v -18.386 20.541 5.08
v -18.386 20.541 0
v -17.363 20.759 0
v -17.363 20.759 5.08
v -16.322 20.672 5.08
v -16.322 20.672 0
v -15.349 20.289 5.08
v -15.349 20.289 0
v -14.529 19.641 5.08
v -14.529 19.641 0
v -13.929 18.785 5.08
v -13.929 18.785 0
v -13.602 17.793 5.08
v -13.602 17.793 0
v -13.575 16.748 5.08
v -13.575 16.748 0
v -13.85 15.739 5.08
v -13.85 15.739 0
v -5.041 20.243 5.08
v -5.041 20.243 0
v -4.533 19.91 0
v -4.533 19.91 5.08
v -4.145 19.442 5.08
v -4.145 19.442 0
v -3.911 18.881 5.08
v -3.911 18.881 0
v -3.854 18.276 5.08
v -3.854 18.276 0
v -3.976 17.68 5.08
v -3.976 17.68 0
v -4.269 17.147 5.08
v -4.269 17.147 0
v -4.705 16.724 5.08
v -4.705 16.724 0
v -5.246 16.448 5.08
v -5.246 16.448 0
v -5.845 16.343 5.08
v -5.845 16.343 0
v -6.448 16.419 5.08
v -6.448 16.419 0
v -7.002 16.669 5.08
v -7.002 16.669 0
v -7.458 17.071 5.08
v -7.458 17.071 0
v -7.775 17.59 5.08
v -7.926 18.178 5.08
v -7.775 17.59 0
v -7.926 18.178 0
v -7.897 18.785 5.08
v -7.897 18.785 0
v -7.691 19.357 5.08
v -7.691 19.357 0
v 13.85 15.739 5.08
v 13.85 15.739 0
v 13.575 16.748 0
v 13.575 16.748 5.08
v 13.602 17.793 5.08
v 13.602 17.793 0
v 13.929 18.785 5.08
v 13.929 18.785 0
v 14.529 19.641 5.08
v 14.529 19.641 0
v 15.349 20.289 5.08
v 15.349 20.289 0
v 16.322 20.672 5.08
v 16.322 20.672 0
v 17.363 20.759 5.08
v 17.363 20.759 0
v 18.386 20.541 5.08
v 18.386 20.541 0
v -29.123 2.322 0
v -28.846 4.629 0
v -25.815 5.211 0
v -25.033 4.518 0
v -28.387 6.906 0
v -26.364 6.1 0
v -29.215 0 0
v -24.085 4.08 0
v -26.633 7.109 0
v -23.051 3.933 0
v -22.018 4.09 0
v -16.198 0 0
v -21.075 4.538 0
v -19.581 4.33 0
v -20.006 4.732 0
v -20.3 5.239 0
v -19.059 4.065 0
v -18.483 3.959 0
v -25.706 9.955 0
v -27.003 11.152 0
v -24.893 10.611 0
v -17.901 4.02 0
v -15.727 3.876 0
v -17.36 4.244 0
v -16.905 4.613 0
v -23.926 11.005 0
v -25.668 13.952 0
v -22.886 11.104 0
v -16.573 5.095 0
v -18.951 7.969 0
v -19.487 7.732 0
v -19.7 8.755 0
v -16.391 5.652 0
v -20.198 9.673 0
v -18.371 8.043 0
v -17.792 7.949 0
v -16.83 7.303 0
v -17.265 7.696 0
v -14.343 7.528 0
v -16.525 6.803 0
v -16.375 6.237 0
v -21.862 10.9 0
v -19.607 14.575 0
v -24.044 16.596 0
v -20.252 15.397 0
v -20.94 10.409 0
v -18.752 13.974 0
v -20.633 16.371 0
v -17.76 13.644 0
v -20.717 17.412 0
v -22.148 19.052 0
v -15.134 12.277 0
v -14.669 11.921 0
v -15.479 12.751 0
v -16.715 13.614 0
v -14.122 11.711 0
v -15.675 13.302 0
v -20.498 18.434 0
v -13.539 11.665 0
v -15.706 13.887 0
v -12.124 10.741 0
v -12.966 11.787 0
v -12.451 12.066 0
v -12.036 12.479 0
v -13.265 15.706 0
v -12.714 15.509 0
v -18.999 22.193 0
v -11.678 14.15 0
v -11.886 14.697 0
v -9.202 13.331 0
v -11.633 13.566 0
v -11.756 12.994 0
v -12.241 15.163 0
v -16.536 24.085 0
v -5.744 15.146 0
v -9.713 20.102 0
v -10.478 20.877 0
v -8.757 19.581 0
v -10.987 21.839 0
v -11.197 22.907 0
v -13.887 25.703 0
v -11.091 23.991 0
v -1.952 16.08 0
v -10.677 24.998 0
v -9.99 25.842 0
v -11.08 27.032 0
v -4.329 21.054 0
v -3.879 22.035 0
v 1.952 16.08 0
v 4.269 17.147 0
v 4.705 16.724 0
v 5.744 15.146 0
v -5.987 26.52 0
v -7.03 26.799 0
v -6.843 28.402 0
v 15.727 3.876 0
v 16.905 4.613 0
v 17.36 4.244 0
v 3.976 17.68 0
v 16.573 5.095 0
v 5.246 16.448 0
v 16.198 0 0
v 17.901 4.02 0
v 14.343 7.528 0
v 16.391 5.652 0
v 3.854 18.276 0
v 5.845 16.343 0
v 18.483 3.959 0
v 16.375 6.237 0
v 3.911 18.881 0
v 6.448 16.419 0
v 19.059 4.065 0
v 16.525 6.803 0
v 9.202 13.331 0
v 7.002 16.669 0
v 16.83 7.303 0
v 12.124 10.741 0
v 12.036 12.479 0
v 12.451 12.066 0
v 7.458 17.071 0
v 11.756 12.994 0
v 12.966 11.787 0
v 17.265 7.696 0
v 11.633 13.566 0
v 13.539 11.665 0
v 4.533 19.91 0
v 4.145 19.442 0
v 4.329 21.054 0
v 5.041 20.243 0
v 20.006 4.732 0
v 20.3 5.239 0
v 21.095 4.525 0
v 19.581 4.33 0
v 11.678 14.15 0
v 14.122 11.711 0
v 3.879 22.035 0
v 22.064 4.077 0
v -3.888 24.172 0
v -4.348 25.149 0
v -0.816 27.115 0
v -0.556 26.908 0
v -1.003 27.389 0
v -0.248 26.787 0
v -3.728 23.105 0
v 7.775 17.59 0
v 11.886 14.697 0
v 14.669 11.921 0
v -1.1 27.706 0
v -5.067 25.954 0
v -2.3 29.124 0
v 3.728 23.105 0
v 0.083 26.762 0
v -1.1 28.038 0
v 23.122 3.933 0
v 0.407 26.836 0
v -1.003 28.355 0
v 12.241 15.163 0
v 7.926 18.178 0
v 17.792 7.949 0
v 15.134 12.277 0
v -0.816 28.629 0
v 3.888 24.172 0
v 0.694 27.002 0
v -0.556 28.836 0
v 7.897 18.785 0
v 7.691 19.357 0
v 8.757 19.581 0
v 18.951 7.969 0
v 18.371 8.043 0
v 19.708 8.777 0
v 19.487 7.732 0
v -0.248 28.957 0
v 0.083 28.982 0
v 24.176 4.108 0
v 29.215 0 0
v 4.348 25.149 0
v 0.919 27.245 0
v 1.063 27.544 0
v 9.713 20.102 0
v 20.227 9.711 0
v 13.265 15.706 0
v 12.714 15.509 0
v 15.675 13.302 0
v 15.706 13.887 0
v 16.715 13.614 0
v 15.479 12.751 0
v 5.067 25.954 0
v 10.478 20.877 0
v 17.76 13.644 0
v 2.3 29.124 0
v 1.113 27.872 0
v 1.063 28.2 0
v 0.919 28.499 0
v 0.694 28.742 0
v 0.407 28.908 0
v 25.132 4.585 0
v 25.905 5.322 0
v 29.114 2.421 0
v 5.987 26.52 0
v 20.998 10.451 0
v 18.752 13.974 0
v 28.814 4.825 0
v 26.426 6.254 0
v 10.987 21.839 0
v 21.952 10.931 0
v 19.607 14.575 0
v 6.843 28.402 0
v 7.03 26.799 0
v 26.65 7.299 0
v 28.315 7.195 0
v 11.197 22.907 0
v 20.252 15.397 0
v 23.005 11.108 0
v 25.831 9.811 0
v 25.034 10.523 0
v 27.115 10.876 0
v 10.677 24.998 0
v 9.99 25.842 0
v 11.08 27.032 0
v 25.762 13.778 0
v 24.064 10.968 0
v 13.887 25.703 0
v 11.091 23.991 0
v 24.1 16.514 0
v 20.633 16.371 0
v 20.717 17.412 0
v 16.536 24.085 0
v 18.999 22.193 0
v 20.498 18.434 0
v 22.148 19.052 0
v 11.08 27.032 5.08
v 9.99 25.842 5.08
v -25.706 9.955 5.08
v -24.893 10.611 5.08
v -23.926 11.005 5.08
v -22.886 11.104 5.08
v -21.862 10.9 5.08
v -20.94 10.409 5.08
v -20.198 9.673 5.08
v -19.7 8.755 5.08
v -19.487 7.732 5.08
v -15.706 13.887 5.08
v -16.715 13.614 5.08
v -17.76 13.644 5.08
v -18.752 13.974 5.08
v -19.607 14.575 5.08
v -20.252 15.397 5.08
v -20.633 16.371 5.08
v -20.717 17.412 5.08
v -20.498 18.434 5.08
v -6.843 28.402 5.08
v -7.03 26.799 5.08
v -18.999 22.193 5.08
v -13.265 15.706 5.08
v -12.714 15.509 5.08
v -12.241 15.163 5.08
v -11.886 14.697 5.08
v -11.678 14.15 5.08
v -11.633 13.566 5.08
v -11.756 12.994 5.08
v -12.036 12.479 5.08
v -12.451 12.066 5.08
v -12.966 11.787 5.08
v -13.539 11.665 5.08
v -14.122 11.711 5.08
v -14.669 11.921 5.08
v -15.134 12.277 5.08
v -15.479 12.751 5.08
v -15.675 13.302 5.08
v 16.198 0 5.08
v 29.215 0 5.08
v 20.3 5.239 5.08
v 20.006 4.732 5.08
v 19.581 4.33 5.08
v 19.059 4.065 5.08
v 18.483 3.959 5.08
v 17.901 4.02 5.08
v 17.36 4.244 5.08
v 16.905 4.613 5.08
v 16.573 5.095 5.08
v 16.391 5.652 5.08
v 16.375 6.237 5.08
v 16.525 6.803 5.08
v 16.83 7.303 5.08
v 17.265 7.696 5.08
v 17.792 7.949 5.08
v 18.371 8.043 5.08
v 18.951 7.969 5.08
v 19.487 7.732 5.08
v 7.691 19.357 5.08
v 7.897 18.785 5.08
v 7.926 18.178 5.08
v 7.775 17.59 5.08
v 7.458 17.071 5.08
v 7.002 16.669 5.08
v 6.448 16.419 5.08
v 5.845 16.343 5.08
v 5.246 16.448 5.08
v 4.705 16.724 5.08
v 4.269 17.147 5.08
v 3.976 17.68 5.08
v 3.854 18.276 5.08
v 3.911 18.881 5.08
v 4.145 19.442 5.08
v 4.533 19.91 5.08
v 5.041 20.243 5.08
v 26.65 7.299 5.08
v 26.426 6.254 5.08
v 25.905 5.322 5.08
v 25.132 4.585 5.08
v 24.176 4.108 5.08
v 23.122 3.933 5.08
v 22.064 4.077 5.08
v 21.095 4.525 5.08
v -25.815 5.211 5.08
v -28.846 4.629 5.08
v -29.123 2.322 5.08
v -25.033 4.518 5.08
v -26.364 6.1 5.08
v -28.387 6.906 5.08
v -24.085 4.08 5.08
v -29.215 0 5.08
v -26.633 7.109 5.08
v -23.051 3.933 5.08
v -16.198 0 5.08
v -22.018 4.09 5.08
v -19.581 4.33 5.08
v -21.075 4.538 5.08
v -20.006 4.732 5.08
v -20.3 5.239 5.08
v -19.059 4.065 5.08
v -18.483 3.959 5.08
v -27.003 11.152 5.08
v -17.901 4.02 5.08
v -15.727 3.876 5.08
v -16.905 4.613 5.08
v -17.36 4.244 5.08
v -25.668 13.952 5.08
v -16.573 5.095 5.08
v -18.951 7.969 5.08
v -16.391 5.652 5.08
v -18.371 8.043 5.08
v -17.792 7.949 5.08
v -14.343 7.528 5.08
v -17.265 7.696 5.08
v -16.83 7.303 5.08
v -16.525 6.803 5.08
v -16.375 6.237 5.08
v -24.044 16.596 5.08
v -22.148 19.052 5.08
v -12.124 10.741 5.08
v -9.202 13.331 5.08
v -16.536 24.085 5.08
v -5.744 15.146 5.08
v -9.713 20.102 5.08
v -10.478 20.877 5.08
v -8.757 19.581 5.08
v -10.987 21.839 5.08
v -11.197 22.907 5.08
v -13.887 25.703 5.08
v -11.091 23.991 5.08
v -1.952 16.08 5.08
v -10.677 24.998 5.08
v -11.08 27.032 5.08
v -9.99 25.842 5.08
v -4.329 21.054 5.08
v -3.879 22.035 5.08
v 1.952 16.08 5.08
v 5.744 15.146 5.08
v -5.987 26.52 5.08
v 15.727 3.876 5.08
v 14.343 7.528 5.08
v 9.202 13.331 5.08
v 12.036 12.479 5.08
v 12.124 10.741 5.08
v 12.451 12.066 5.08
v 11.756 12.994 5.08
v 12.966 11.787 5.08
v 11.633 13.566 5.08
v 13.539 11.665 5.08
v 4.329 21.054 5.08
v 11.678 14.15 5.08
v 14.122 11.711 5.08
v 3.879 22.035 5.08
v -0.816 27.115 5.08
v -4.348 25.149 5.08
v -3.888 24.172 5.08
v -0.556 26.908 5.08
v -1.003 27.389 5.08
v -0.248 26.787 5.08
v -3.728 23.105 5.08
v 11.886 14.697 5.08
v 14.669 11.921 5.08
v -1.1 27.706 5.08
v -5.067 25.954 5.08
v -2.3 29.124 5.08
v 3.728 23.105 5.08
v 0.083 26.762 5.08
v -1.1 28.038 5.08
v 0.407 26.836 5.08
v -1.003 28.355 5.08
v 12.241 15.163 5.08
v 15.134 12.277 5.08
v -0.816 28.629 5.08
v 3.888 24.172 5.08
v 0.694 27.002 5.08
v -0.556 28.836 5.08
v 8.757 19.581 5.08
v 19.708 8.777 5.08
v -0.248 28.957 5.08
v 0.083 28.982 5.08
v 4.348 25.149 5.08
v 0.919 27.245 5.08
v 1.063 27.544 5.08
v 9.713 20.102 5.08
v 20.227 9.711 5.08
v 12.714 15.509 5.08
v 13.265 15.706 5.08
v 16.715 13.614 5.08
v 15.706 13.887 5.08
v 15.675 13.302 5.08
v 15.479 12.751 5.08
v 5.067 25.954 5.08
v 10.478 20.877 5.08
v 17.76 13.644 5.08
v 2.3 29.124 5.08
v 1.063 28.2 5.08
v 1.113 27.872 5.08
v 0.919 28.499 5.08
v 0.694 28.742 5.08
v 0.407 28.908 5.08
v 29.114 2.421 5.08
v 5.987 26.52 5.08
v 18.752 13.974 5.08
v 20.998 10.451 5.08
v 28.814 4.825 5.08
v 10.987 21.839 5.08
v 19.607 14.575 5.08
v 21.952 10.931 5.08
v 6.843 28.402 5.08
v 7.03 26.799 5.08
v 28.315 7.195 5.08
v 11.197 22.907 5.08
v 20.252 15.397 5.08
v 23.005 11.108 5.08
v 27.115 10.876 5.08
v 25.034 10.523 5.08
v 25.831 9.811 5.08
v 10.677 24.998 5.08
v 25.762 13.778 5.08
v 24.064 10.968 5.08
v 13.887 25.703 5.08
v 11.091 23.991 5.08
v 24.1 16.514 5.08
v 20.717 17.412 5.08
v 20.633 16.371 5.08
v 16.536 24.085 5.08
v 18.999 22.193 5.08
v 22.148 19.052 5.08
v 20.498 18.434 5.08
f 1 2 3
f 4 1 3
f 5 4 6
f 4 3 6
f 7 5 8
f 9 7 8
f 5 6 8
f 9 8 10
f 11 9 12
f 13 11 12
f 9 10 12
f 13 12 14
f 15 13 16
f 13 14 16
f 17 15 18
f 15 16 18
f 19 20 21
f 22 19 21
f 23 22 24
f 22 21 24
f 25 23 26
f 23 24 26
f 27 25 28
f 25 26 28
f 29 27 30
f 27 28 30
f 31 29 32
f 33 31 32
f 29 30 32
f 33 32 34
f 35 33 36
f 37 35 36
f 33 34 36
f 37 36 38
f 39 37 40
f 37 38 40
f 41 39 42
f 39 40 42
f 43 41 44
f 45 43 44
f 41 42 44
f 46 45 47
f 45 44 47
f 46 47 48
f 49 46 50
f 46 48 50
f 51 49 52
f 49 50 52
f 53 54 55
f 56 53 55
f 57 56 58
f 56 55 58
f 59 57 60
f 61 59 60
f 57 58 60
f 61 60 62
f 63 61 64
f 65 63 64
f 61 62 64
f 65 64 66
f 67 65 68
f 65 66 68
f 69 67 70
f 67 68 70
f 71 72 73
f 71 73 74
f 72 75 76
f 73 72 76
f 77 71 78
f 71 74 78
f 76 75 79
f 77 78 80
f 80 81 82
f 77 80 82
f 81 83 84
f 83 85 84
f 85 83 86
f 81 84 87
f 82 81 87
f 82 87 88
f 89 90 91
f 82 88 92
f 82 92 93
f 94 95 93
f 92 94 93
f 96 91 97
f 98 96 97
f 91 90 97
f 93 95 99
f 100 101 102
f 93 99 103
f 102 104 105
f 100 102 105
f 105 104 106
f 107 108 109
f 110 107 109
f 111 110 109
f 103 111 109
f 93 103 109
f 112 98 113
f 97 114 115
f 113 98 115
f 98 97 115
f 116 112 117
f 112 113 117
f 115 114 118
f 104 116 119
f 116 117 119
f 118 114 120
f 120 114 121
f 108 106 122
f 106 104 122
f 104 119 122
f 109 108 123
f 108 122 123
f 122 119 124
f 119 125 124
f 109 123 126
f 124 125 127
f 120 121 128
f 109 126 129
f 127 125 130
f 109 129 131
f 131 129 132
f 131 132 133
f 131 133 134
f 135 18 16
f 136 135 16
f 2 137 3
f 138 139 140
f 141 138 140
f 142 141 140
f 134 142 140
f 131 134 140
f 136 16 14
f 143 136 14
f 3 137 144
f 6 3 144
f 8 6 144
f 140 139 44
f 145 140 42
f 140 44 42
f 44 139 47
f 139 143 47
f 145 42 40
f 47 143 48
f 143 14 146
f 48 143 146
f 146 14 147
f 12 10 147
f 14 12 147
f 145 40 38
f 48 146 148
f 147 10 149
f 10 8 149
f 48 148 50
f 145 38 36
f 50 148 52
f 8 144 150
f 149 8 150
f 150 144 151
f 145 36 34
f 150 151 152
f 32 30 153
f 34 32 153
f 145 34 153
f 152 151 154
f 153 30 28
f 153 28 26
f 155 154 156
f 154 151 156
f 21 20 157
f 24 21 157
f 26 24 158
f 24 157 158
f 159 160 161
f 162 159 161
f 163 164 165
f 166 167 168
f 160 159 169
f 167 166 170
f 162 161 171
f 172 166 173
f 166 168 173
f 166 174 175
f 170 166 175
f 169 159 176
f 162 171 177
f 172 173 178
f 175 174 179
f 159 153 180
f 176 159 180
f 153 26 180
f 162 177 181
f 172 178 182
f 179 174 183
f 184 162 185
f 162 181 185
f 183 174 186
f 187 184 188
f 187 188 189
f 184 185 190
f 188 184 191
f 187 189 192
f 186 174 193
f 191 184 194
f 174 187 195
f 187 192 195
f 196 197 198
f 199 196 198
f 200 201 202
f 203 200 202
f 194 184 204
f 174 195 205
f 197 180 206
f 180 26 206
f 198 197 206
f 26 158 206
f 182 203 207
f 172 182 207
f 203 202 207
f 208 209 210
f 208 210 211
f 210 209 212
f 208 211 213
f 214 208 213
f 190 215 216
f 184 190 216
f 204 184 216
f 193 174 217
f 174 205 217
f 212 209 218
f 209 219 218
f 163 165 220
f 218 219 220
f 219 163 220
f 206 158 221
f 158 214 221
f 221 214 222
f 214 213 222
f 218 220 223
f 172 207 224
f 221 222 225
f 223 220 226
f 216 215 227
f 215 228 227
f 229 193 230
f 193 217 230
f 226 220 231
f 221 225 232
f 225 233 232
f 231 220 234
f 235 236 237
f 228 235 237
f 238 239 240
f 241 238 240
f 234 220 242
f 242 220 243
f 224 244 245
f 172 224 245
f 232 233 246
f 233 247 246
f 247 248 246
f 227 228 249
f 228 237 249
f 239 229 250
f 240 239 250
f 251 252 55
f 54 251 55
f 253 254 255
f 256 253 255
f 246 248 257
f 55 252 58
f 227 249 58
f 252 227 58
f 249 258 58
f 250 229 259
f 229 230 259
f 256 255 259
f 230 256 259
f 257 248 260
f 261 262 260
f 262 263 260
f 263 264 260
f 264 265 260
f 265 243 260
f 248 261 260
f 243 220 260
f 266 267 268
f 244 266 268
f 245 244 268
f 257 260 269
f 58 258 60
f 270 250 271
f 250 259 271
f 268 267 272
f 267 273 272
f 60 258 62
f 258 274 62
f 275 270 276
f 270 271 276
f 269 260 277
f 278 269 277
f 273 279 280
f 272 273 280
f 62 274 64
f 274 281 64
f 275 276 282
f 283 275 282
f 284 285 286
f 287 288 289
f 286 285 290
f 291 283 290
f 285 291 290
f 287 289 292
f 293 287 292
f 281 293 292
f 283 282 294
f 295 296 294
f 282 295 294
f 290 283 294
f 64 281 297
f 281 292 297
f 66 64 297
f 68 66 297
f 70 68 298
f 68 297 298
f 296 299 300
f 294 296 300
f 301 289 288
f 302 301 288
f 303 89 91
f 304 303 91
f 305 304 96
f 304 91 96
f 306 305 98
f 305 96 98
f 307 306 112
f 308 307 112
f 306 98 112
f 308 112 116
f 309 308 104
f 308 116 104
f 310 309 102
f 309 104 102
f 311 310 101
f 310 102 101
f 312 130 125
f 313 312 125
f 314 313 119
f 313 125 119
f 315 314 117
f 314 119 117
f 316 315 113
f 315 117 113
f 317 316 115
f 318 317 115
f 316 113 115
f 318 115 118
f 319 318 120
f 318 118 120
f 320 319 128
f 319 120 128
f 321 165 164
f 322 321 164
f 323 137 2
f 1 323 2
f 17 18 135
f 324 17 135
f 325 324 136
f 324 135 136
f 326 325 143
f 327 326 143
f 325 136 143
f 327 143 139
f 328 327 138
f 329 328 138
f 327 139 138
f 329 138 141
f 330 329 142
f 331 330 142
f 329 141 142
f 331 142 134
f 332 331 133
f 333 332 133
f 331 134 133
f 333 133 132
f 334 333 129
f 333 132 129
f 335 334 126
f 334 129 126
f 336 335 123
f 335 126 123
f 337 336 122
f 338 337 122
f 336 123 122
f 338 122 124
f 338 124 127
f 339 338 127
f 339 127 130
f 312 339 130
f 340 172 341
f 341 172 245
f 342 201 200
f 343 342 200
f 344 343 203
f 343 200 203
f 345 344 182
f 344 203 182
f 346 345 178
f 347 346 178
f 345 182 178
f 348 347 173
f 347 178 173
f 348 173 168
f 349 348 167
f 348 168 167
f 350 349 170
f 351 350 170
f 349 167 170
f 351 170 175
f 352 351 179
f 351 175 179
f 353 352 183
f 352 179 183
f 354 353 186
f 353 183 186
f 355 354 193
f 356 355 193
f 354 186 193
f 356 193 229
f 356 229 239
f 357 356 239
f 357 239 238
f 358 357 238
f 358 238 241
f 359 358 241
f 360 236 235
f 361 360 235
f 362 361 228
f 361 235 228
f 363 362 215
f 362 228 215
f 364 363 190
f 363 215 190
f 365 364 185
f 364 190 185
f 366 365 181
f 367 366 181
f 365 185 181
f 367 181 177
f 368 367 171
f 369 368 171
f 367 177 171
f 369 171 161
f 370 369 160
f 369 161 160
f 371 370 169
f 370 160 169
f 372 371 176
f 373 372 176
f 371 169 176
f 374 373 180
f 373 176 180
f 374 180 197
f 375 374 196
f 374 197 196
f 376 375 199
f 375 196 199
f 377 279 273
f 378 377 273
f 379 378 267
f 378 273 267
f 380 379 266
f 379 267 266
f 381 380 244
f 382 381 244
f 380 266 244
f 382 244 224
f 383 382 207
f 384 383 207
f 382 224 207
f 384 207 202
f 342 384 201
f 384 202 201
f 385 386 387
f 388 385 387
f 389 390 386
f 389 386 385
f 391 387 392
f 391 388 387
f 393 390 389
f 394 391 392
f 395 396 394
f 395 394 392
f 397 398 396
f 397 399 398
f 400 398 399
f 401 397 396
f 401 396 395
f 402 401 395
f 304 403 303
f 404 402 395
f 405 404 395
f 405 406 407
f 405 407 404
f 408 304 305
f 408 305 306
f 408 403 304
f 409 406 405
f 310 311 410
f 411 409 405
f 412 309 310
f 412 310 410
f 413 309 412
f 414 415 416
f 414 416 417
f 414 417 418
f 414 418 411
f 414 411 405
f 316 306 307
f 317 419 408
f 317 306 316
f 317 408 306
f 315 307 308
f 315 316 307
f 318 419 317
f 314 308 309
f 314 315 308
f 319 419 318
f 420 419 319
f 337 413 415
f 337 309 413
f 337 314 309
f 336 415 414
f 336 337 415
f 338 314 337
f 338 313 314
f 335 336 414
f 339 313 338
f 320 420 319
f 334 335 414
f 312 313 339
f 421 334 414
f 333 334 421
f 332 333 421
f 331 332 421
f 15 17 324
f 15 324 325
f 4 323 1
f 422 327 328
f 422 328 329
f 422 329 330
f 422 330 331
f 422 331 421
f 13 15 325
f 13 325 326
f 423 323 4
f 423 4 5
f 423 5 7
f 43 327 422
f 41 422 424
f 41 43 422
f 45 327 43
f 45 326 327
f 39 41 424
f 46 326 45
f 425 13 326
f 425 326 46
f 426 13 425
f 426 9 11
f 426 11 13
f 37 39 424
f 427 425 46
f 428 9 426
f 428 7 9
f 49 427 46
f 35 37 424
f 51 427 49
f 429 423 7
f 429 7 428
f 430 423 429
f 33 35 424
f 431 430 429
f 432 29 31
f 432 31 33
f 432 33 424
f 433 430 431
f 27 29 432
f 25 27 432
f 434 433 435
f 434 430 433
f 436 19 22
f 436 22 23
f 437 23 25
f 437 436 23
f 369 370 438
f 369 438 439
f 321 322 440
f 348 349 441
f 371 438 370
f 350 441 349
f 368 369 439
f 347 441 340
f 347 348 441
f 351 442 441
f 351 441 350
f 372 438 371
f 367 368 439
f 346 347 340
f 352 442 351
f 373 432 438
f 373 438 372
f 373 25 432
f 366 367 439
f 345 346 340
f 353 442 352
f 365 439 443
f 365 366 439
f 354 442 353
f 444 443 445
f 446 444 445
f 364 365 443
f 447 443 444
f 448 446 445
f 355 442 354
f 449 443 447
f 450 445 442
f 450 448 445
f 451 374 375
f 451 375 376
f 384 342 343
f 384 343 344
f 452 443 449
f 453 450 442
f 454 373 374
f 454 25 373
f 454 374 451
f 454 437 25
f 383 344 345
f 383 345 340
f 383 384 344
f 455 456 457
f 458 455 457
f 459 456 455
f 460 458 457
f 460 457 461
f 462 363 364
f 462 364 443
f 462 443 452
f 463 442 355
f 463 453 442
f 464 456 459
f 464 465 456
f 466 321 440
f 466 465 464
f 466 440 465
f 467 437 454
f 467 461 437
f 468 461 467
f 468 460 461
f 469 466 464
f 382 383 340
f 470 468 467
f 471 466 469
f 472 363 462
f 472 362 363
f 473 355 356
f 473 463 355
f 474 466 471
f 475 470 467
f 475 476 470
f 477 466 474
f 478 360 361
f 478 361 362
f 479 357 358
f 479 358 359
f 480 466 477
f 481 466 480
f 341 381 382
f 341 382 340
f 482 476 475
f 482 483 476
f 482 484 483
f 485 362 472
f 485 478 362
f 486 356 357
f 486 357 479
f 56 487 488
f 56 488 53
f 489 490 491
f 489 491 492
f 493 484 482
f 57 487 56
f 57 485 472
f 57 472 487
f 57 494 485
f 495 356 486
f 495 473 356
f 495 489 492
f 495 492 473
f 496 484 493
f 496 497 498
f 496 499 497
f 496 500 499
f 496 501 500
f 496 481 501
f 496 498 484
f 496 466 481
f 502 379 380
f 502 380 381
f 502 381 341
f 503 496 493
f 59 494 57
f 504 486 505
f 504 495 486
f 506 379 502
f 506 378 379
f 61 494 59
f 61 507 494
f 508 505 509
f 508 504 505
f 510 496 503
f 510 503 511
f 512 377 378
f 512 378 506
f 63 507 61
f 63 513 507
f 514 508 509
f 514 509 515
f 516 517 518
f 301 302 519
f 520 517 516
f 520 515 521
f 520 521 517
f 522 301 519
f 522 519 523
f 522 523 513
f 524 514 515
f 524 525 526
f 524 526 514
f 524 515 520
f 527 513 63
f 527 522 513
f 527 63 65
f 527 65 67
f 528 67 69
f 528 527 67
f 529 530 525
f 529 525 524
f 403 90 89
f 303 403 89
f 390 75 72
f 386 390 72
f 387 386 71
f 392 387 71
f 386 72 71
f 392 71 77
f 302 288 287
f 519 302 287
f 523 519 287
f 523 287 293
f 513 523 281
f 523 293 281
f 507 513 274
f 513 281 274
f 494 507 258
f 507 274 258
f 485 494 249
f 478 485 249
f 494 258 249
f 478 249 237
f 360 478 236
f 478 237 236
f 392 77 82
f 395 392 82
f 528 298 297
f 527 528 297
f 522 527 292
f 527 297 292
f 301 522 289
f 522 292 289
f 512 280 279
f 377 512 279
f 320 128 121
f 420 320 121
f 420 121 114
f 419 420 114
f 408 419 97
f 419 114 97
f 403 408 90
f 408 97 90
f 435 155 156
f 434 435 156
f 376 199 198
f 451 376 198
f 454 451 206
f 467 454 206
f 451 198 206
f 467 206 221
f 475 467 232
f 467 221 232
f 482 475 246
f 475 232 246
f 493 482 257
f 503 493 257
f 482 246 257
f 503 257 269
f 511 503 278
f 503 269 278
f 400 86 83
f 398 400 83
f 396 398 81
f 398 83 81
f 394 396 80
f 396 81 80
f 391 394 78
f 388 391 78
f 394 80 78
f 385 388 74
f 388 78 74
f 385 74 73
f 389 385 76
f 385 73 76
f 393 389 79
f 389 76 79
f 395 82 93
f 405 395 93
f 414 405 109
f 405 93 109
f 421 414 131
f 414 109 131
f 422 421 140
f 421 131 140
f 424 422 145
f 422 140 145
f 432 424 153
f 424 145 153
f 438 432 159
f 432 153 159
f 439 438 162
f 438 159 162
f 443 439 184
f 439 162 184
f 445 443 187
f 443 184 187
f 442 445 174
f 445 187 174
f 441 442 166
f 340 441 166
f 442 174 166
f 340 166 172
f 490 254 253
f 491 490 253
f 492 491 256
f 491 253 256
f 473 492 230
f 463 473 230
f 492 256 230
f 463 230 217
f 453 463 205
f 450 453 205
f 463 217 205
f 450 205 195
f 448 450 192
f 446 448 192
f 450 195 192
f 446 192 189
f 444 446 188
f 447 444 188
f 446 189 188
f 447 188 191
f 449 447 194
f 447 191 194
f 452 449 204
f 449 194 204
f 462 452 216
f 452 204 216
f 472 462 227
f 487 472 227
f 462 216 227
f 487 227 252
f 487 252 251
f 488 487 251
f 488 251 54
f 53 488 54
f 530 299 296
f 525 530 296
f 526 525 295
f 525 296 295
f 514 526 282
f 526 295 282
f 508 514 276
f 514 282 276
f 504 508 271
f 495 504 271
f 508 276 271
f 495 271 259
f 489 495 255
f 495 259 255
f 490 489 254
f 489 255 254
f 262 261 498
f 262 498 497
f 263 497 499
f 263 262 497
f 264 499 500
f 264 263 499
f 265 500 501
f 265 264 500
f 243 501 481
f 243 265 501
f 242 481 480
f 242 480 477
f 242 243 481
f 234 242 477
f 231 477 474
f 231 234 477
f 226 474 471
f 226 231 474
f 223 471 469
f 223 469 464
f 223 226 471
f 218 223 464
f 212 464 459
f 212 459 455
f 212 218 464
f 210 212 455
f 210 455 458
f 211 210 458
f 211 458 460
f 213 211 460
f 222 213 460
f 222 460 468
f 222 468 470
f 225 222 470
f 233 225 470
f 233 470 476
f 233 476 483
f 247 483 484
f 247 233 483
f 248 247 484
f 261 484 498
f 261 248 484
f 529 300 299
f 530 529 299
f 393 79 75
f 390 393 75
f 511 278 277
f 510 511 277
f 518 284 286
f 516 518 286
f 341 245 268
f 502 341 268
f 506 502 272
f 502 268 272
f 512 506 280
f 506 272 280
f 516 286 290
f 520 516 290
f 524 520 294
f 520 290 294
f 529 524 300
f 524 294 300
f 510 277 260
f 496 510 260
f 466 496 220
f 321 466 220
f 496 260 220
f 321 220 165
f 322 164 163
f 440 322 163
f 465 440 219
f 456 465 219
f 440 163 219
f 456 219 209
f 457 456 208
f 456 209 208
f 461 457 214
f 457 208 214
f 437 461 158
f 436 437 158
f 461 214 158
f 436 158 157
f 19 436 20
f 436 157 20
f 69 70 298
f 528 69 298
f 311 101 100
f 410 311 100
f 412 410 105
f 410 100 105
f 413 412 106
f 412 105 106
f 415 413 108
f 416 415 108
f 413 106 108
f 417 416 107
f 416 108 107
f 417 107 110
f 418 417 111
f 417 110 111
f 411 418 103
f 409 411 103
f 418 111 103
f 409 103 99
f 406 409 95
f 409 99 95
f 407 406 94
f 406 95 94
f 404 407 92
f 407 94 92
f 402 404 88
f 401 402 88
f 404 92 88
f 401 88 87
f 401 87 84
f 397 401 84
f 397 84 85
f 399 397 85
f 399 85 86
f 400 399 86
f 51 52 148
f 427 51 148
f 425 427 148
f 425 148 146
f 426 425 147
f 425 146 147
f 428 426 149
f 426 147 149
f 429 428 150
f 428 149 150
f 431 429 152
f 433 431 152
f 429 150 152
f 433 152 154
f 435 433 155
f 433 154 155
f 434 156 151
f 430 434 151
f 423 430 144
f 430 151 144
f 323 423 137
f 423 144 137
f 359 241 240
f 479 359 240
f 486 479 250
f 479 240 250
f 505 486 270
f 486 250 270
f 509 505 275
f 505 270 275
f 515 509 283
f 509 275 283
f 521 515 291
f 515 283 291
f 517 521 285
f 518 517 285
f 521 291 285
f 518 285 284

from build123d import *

# Parameters (mm, degrees)
F0_R     = 1.11278
F1_DEPTH = 5.08


with BuildPart() as f1:
    # F0 (on Top) → F1 (new body)
    with BuildSketch(Plane.XY):
        with BuildLine():
            ThreePointArc((-16.198163, 0), (0, 16.198163), (16.198163, 0))
            Line((16.198163, 0), (29.21493, 0))
            ThreePointArc((29.21493, 0), (28.989076, 3.625685), (28.315007, 7.195311))
            Line((28.315007, 7.195311), (26.650215, 7.298667))
            ThreePointArc((26.650215, 7.298667), (24.176076, 4.107999), (20.300193, 5.239043))
            ThreePointArc((20.300193, 5.239043), (16.461726, 5.366865), (19.487275, 7.732498))
            ThreePointArc((19.487275, 7.732498), (21.951756, 10.930632), (25.83104, 9.811312))
            Line((25.83104, 9.811312), (27.115017, 10.876028))
            ThreePointArc((27.115017, 10.876028), (24.968577, 15.168464), (22.148354, 19.051576))
            Line((22.148354, 19.051576), (20.497724, 18.434355))
            ThreePointArc((20.497724, 18.434355), (19.606952, 14.575136), (15.706482, 13.88711))
            ThreePointArc((15.706482, 13.88711), (12.228664, 12.25771), (13.849808, 15.739384))
            ThreePointArc((13.849808, 15.739384), (14.528579, 19.641475), (18.385674, 20.5414))
            Line((18.385674, 20.5414), (18.998977, 22.19349))
            ThreePointArc((18.998977, 22.19349), (15.233076, 24.92921), (11.080488, 27.032109))
            Line((11.080488, 27.032109), (9.98984, 25.842269))
            ThreePointArc((9.98984, 25.842269), (10.987015, 21.838828), (7.691111, 19.357112))
            ThreePointArc((7.691111, 19.357112), (5.246235, 16.44803), (5.041196, 20.242517))
            ThreePointArc((5.041196, 20.242517), (3.888406, 24.172243), (7.030199, 26.799181))
            Line((7.030199, 26.799181), (6.842575, 28.402312))
            ThreePointArc((6.842575, 28.402312), (0, 29.21493), (-6.842575, 28.402312))
            Line((-6.842575, 28.402312), (-7.030199, 26.799181))
            ThreePointArc((-7.030199, 26.799181), (-3.888406, 24.172243), (-5.041196, 20.242517))
            ThreePointArc((-5.041196, 20.242517), (-5.246235, 16.44803), (-7.691111, 19.357112))
            ThreePointArc((-7.691111, 19.357112), (-10.987015, 21.838828), (-9.98984, 25.842269))
            Line((-9.98984, 25.842269), (-11.080488, 27.032109))
            ThreePointArc((-11.080488, 27.032109), (-15.233076, 24.92921), (-18.998977, 22.19349))
            Line((-18.998977, 22.19349), (-18.385674, 20.5414))
            ThreePointArc((-18.385674, 20.5414), (-14.528579, 19.641475), (-13.849808, 15.739384))
            ThreePointArc((-13.849808, 15.739384), (-12.228664, 12.25771), (-15.706482, 13.88711))
            ThreePointArc((-15.706482, 13.88711), (-19.606952, 14.575136), (-20.497724, 18.434355))
            Line((-20.497724, 18.434355), (-22.148354, 19.051576))
            ThreePointArc((-22.148354, 19.051576), (-24.890954, 15.295507), (-27.002761, 11.151817))
            Line((-27.002761, 11.151817), (-25.705667, 9.954591))
            ThreePointArc((-25.705667, 9.954591), (-21.861689, 10.899789), (-19.487275, 7.732498))
            ThreePointArc((-19.487275, 7.732498), (-16.461726, 5.366865), (-20.300193, 5.239043))
            ThreePointArc((-20.300193, 5.239043), (-24.085137, 4.079831), (-26.633381, 7.109026))
            Line((-26.633381, 7.109026), (-28.38687, 6.906354))
            ThreePointArc((-28.38687, 6.906354), (-29.007176, 3.477909), (-29.21493, 0))
            Line((-29.21493, 0), (-16.198163, 0))
        make_face()
        with Locations((0, 27.872039)):
            Circle(F0_R, mode=Mode.SUBTRACT)
    extrude(amount=F1_DEPTH)


solid = f1.part
